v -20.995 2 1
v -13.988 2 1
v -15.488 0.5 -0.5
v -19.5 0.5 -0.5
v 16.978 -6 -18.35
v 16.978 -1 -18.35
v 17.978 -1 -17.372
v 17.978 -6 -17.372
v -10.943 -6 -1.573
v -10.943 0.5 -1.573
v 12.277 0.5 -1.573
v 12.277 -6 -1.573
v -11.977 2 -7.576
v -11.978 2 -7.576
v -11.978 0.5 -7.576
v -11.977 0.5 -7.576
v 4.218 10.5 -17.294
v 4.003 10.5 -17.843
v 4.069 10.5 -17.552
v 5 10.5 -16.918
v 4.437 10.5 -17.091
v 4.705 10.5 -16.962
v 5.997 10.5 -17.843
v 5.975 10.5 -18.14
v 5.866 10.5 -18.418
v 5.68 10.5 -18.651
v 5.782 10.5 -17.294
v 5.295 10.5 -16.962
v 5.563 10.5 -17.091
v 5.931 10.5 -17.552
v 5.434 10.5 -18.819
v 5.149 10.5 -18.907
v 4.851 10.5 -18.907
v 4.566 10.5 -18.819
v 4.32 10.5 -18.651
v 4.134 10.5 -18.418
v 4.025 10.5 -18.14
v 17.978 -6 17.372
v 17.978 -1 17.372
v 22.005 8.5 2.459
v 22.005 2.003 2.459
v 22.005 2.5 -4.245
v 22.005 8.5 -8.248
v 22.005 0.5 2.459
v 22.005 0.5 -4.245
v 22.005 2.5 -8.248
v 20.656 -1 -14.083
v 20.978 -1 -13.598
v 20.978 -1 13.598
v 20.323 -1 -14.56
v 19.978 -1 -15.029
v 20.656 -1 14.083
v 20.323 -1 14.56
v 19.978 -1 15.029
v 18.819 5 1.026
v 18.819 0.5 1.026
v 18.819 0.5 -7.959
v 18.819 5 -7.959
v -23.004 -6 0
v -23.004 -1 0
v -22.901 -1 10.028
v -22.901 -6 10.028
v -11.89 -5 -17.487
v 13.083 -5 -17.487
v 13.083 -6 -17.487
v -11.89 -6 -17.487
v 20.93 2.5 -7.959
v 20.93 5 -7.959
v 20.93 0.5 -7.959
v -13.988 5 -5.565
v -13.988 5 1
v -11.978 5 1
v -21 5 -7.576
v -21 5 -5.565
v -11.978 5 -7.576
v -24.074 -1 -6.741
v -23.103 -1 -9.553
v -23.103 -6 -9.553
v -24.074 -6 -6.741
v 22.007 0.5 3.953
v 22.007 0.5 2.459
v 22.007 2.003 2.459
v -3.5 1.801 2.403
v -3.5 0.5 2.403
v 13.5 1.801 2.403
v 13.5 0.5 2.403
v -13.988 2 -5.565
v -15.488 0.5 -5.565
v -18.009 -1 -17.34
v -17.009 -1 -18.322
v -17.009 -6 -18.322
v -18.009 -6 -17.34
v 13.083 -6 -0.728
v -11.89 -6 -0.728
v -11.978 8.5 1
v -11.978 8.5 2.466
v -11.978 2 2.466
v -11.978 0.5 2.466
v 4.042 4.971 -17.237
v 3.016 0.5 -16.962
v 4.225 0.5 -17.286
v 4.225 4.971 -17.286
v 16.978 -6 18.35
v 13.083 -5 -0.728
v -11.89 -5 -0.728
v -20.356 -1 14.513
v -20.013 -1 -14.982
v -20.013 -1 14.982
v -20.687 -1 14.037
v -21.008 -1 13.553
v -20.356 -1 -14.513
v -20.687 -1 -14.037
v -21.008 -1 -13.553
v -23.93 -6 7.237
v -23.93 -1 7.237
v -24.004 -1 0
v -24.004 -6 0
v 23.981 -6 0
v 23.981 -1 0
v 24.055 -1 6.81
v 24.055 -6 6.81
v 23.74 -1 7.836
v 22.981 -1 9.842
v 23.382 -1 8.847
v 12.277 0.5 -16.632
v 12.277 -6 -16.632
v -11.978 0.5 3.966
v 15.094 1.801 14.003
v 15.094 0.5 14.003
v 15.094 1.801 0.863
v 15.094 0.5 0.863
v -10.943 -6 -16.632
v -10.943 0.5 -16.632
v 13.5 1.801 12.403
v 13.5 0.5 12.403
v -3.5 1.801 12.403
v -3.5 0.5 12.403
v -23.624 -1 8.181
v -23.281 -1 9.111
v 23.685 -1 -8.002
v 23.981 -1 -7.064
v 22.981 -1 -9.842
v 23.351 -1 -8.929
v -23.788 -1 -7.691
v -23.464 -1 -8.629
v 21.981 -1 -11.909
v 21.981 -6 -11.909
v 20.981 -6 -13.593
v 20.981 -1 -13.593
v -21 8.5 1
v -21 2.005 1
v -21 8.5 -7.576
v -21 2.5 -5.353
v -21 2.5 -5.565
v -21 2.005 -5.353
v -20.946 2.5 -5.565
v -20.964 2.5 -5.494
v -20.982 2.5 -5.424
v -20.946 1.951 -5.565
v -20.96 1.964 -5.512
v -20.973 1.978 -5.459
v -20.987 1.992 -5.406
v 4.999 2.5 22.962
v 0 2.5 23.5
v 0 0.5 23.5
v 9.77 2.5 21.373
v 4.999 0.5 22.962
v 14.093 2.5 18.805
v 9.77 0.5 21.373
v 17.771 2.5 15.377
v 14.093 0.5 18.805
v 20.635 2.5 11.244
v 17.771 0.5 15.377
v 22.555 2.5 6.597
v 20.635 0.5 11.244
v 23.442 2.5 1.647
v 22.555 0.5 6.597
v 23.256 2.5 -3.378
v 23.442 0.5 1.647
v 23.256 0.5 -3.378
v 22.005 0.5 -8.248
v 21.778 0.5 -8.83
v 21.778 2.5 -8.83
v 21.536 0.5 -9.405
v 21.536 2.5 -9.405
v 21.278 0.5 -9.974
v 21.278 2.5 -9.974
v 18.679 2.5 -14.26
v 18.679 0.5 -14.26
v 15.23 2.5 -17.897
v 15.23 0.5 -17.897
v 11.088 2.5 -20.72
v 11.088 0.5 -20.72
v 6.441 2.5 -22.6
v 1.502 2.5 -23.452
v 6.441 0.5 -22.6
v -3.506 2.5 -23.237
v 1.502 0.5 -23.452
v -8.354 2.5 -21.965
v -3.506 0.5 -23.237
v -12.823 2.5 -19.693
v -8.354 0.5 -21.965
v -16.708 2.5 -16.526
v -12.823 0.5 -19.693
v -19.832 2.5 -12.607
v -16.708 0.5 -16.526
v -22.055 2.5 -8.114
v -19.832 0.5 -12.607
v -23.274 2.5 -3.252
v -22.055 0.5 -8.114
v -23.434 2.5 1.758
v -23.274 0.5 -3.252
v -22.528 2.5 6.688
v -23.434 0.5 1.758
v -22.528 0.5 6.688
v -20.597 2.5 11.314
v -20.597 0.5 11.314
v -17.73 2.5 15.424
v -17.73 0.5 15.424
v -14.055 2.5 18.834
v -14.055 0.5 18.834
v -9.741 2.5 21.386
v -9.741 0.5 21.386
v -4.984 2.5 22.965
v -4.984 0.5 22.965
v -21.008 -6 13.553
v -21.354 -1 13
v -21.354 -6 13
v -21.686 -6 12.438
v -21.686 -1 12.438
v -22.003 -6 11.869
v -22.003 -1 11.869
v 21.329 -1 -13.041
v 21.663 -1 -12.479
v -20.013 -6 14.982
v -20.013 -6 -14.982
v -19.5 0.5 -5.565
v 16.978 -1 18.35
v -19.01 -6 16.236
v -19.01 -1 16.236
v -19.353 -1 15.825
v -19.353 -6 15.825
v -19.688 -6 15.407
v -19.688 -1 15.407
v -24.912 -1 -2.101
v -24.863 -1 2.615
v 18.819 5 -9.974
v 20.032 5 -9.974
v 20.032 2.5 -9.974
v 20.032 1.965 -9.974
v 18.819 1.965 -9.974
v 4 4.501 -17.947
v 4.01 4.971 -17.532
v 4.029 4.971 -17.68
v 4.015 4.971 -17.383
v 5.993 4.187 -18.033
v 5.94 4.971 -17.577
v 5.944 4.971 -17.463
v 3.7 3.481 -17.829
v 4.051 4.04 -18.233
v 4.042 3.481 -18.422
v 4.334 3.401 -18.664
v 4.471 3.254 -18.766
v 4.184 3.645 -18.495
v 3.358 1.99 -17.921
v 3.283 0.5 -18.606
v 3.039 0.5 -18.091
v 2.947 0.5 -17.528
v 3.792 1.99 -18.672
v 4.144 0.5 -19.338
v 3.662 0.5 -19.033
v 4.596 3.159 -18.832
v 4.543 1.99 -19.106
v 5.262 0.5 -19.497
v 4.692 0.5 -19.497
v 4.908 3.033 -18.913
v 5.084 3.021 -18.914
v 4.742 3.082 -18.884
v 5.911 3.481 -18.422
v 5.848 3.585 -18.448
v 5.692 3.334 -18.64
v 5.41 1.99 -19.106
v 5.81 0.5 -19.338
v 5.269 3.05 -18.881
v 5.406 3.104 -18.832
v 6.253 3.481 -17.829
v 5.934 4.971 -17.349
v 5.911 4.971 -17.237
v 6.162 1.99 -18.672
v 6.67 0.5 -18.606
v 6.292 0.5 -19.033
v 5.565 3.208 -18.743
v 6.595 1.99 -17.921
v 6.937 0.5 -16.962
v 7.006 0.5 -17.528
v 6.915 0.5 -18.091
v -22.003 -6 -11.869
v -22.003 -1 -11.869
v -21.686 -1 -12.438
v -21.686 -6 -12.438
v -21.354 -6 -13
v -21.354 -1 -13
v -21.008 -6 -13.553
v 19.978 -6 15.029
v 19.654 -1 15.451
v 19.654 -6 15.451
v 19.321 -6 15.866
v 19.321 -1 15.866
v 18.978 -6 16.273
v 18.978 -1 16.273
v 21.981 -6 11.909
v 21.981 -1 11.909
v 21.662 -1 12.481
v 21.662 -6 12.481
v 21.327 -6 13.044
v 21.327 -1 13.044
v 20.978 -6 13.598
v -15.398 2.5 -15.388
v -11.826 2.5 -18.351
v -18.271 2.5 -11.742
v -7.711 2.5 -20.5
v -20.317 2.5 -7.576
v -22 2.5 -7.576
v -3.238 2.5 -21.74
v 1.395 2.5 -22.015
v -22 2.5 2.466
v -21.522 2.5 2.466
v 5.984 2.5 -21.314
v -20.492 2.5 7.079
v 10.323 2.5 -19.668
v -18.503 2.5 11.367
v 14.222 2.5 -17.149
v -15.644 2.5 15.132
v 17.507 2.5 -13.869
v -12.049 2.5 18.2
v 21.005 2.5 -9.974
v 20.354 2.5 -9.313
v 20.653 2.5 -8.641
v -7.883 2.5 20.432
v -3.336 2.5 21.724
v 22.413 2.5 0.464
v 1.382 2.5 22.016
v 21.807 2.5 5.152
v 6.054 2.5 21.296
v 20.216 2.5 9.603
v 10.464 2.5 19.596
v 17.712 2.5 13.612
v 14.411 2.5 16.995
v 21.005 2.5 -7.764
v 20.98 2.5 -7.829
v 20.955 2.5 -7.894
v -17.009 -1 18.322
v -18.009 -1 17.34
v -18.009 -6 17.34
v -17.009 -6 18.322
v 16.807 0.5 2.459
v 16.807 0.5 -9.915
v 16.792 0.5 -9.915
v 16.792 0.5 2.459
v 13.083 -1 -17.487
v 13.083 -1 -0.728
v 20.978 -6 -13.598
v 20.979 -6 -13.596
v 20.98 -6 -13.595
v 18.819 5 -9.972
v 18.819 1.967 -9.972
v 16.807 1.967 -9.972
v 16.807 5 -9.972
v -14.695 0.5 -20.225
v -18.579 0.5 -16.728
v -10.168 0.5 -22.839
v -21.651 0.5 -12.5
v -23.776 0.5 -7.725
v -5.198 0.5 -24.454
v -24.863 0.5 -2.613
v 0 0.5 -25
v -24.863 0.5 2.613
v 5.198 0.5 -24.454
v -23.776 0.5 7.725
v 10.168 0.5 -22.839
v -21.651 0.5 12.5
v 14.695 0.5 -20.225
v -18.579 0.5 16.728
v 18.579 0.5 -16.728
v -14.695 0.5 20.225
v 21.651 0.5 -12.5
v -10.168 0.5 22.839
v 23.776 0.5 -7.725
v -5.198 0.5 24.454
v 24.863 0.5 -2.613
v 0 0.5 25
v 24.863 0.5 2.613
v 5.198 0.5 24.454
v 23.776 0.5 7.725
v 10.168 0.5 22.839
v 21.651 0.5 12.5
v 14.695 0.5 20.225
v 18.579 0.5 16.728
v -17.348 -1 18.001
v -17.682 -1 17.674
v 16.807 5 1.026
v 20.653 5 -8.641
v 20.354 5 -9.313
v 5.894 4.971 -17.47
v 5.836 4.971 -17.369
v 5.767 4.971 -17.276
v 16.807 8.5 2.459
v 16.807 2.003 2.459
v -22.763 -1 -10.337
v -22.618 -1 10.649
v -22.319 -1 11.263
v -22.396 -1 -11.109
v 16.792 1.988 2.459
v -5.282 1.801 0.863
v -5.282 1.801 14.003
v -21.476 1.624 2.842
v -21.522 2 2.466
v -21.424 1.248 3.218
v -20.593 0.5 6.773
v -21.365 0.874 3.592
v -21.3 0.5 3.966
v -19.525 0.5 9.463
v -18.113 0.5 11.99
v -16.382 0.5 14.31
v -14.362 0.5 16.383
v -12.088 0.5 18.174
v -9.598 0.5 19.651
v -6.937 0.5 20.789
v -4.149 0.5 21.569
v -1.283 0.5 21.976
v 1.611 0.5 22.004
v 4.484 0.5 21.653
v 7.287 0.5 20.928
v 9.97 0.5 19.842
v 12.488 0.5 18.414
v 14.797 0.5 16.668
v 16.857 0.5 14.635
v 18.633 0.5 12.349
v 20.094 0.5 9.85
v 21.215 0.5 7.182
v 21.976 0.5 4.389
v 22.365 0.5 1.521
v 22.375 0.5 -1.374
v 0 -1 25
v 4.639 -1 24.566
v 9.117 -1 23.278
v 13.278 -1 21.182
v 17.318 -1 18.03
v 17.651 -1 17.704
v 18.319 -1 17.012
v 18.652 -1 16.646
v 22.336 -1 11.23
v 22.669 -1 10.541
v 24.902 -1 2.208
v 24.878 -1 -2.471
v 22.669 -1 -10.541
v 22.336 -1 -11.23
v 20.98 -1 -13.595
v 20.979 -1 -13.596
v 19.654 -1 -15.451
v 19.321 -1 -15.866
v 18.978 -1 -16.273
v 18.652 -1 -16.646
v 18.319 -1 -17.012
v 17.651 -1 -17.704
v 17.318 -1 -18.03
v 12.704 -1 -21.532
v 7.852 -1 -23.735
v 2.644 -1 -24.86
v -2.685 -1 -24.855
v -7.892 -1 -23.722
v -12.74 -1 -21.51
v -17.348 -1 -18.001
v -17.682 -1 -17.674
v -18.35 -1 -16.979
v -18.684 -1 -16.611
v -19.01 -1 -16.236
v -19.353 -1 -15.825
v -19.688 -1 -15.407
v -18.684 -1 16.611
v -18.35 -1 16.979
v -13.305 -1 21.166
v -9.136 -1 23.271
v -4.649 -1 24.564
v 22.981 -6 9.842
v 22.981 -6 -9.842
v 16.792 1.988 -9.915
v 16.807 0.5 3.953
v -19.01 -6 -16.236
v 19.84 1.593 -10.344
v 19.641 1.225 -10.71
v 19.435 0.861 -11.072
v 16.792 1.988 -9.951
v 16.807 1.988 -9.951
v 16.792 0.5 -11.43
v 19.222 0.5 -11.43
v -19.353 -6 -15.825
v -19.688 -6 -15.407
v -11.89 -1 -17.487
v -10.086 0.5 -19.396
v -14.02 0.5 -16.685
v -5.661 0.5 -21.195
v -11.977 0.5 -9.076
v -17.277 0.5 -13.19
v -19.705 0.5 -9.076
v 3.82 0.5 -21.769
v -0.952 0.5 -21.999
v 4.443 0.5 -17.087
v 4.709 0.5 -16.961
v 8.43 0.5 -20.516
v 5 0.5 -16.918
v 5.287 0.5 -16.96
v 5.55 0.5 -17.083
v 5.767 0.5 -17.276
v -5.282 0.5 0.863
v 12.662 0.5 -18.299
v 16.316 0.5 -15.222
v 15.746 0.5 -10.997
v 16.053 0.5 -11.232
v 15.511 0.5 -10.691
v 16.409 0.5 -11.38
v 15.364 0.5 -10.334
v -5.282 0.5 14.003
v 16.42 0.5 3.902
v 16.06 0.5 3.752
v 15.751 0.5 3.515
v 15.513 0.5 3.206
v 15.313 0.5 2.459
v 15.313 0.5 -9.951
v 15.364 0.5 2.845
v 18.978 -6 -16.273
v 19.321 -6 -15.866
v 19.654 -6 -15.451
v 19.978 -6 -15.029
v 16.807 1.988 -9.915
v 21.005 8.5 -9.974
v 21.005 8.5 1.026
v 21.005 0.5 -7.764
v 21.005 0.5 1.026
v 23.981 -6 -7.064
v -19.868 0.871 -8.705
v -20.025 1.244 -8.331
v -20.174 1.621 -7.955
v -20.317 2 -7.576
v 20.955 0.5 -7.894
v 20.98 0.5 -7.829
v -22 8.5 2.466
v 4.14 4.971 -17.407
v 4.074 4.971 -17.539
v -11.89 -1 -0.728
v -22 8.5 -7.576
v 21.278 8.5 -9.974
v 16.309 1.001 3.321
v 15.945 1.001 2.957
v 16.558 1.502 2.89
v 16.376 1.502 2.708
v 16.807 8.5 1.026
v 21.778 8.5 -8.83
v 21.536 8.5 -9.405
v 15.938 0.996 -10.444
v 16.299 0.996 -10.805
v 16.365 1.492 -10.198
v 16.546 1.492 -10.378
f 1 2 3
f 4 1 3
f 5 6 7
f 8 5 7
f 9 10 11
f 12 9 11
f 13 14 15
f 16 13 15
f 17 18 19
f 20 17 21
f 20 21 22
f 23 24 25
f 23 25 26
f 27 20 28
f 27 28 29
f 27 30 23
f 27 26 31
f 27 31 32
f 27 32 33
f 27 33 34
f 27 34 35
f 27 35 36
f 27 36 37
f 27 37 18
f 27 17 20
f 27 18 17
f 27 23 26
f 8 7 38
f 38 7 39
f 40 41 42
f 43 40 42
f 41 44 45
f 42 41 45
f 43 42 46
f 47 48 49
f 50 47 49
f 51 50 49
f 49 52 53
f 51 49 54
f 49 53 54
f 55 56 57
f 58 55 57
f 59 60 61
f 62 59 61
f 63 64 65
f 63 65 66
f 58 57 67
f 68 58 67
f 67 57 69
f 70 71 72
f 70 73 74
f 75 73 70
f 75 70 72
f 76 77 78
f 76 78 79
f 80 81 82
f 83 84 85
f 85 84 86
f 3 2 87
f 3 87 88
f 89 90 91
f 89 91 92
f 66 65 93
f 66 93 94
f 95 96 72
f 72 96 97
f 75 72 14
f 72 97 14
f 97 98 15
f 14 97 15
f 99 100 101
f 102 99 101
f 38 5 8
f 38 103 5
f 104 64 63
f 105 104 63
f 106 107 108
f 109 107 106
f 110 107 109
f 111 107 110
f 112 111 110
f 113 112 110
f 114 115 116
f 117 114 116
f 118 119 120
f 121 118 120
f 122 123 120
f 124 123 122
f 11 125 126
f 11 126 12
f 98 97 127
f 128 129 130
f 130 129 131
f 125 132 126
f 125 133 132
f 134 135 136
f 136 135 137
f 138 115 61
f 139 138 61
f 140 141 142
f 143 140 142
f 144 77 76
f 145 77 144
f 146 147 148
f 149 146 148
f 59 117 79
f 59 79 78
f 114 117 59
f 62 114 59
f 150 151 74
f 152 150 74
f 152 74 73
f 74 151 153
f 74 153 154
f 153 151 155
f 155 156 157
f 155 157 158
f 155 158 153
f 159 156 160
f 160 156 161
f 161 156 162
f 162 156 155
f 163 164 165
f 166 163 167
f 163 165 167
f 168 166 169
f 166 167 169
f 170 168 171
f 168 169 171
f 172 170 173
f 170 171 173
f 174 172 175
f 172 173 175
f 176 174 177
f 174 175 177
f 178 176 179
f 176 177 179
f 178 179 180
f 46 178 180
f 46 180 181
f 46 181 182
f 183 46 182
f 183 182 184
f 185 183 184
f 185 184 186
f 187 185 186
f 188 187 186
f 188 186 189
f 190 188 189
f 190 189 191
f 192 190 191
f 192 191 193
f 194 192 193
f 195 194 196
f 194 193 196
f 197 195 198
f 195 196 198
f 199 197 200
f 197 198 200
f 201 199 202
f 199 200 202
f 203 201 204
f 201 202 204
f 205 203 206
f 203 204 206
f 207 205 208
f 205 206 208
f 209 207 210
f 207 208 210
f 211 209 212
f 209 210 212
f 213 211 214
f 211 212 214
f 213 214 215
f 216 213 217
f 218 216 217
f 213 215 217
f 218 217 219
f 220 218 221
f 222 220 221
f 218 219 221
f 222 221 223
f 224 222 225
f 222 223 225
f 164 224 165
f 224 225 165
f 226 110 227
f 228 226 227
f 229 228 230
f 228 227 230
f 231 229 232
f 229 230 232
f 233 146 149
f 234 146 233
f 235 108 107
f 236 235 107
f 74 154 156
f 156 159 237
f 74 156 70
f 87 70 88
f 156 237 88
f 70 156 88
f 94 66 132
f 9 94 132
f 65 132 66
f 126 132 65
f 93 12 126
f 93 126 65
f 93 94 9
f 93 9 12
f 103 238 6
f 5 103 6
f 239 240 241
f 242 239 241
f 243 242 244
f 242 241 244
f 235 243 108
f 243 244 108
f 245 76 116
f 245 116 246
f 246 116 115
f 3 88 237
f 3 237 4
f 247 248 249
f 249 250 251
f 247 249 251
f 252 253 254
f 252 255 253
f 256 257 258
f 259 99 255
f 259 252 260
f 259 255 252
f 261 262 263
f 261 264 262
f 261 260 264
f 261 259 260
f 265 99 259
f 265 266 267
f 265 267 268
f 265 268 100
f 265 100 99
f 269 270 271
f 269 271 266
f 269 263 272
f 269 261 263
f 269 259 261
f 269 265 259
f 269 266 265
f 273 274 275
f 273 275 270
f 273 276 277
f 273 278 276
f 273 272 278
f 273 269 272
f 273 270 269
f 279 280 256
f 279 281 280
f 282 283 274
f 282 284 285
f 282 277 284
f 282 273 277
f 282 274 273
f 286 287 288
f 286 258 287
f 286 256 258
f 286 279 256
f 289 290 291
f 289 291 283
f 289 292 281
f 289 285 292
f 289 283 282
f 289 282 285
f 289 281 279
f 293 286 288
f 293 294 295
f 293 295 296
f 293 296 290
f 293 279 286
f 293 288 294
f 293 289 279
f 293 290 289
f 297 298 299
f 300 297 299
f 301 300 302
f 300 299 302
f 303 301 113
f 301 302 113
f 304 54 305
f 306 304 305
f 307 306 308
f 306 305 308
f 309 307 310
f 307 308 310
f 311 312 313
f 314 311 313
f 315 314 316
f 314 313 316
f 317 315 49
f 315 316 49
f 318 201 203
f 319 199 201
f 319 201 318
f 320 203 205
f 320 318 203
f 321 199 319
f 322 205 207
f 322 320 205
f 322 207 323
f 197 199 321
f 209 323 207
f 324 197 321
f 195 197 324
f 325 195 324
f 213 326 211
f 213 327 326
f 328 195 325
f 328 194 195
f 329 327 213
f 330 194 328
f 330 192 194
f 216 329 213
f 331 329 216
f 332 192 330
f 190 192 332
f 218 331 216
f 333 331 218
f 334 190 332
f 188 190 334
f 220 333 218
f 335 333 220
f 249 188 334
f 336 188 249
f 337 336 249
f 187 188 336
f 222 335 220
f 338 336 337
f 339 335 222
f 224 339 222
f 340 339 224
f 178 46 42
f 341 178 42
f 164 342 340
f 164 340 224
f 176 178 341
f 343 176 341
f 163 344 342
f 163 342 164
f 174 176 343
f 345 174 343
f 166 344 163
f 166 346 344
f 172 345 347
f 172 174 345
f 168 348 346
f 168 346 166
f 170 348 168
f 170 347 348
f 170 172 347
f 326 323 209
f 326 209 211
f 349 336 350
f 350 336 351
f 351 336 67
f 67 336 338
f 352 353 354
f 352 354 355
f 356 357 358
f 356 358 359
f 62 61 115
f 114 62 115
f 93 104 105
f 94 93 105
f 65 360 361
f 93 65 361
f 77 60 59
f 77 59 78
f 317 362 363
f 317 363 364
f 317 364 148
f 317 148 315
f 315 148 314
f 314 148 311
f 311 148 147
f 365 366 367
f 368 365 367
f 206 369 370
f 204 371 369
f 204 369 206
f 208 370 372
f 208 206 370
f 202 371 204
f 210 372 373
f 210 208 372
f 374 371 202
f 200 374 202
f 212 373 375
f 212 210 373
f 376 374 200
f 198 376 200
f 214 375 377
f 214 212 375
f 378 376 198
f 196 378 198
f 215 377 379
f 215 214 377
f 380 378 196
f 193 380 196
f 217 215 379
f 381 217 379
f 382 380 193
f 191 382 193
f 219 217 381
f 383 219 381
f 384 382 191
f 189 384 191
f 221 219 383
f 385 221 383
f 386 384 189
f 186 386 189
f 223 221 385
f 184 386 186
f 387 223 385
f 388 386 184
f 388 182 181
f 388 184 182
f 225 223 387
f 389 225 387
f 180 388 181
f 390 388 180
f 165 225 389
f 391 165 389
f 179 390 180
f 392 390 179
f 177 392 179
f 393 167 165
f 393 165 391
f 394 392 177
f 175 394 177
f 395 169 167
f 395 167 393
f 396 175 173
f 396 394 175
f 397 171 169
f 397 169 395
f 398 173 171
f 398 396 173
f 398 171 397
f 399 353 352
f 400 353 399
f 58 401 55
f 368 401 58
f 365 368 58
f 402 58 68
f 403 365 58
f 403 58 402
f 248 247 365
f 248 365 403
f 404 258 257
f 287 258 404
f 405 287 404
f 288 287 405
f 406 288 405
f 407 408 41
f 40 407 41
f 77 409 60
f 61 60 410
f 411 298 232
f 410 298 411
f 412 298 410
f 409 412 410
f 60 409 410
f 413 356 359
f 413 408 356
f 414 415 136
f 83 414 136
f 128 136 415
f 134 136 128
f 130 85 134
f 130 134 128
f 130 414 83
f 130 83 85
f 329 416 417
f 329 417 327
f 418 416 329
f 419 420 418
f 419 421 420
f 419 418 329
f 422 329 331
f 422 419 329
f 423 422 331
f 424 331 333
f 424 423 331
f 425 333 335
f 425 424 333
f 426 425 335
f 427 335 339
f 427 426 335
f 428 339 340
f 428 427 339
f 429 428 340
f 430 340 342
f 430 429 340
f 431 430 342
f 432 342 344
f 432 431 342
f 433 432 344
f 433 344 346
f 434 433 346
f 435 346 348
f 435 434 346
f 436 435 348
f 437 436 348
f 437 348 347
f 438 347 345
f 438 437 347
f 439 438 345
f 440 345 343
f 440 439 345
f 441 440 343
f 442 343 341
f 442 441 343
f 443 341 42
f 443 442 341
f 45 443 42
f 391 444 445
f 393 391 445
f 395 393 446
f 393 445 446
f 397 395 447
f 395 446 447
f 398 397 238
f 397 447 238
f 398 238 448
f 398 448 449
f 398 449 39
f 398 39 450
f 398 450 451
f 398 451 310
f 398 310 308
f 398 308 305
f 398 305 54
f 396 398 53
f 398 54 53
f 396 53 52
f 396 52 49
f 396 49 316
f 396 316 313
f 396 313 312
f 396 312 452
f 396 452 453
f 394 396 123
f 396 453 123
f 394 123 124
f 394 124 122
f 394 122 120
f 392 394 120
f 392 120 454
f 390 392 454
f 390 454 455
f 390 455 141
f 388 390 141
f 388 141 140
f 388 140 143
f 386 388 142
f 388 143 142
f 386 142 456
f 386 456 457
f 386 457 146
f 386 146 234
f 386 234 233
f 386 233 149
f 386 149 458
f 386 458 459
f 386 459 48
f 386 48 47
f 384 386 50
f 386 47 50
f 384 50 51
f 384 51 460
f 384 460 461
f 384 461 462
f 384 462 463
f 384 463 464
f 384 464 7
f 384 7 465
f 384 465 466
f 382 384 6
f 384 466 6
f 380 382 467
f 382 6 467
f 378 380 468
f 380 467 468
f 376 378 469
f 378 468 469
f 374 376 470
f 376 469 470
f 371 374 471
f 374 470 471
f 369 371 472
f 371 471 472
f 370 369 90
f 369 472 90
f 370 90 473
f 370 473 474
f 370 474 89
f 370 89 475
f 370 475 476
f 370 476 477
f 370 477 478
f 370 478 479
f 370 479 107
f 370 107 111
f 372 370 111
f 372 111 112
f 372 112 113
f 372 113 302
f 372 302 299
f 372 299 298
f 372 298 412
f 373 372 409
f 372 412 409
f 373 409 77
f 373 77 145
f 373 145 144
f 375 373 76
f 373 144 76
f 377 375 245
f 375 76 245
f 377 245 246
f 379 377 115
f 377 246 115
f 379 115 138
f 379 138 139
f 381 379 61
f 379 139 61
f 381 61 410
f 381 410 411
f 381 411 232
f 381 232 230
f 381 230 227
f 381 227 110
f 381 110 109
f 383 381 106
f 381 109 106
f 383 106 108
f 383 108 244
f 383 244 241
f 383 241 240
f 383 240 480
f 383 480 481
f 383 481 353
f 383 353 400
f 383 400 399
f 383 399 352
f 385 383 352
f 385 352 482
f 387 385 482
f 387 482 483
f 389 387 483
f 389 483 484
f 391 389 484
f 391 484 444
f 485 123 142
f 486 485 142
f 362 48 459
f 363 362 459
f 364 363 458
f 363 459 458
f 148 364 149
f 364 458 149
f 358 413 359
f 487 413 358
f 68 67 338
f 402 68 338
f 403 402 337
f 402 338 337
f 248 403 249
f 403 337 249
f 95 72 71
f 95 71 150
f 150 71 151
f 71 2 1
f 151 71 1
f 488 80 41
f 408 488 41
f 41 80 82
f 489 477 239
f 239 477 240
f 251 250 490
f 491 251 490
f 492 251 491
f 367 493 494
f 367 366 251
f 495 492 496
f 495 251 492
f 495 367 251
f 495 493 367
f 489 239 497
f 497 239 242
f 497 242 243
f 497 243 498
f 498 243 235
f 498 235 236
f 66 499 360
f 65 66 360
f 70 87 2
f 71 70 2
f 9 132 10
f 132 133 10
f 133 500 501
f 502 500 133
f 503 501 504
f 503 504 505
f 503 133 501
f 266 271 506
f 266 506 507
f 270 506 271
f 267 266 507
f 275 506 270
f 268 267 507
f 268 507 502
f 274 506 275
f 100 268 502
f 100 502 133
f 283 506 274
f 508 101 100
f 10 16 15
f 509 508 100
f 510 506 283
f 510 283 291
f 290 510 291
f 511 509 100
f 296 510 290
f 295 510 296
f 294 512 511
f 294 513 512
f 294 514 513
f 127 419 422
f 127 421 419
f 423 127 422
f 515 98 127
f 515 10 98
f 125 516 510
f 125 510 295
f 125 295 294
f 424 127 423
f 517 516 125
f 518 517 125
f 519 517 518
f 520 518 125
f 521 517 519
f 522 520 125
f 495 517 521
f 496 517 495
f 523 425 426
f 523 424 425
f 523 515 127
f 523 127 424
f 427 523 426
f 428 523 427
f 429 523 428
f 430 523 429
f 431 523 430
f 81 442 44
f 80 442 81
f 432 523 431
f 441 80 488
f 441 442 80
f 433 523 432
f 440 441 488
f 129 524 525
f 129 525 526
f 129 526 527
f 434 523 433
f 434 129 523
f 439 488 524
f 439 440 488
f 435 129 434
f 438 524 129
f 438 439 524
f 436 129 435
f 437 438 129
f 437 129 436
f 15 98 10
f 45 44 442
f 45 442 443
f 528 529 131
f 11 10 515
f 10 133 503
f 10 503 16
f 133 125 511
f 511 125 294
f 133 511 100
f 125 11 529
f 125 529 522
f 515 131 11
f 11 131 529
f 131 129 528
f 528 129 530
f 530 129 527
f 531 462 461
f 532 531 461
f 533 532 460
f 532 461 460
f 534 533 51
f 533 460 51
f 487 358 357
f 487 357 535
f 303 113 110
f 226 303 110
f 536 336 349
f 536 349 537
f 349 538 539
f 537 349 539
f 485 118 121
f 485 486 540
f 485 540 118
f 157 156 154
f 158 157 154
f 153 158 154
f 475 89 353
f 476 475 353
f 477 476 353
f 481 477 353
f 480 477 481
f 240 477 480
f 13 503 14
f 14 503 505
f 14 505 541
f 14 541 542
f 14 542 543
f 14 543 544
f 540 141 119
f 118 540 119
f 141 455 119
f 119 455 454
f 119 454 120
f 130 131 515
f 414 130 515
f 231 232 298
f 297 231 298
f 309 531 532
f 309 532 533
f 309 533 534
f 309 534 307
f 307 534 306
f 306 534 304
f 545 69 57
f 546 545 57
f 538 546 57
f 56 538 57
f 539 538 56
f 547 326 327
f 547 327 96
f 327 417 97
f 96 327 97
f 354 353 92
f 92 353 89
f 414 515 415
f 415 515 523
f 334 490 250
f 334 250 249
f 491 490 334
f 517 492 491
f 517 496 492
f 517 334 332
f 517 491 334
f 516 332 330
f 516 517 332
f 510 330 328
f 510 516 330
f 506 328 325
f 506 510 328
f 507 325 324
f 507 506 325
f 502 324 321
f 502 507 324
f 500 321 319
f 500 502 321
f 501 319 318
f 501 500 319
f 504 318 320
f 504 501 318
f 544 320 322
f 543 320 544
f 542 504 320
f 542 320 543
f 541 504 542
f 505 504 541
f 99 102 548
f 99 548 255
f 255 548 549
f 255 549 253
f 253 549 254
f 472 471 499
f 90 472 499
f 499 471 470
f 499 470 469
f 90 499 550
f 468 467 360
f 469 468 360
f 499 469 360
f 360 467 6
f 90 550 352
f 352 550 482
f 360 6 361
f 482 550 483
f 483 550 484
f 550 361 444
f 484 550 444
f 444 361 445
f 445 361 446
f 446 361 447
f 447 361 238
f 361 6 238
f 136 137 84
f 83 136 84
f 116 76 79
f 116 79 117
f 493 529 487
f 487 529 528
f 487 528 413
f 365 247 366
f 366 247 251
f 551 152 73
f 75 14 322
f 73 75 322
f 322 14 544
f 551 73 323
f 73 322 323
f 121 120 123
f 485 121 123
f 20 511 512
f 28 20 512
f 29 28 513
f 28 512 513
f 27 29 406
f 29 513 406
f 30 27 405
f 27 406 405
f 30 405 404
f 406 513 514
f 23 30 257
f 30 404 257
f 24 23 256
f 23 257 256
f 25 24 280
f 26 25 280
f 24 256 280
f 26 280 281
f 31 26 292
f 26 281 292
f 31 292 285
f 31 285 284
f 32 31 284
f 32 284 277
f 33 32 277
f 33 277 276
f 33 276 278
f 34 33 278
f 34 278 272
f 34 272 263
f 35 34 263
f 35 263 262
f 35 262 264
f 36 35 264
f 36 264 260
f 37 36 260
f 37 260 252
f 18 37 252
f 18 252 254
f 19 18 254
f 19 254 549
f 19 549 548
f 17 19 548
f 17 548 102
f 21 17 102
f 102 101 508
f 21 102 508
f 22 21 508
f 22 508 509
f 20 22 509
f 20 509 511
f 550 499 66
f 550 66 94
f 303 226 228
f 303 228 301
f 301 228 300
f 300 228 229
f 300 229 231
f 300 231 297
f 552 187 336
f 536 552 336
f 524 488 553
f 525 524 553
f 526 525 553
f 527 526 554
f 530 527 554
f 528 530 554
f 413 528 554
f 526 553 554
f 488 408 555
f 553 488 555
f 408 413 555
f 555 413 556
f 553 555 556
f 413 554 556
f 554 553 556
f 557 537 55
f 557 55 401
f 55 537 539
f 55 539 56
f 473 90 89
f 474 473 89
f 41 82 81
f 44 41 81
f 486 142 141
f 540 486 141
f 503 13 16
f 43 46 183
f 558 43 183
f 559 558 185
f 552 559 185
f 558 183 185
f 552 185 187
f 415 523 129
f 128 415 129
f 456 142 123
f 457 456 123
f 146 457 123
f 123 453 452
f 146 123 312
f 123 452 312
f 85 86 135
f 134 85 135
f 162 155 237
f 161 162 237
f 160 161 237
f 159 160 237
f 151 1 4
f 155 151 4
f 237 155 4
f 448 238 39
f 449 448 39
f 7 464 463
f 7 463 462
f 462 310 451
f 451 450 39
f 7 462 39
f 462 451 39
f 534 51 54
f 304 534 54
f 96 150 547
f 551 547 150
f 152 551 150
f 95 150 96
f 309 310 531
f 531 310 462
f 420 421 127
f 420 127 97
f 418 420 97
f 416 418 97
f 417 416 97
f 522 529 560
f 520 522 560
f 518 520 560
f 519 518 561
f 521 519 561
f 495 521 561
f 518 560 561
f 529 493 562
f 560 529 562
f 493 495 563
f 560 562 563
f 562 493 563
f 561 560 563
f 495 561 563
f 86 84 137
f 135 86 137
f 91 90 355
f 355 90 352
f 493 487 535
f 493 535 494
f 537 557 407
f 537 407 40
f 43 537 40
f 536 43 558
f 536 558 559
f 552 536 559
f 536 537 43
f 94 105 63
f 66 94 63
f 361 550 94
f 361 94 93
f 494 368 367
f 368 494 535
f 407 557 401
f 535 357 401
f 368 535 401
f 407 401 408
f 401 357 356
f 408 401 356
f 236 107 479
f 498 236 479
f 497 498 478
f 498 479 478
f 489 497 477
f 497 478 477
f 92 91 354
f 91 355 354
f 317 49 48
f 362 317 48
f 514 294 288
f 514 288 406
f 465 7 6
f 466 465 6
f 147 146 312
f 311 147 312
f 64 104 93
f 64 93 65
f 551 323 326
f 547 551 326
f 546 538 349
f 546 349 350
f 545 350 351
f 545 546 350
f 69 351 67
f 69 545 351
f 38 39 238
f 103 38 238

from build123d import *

# Parameters (mm, degrees)
BOSS_EXTRUDE1_DEPTH       = 0.5
BOSS_EXTRUDE1_DEPTH_BACK  = 1
SKETCH1_R                 = 25
SKETCH17_R                = 23.5
SKETCH17_R_2              = 22.038870545
BOSS_EXTRUDE15_DEPTH      = 2
SKETCH2_R                 = 1
BOSS_EXTRUDE2_DEPTH       = 10
BOSS_EXTRUDE11_DEPTH      = 5
SKETCH12_W                = 23.219340148
SKETCH12_H                = 15.058436642
CUT_EXTRUDE2_DEPTH        = 5
SKETCH15_W                = 24.972946701
SKETCH15_H                = 16.75913787
SKETCH15_W_2              = 23.219340148
SKETCH15_H_2              = 15.058436642
BOSS_EXTRUDE13_DEPTH      = 5
BOSS_EXTRUDE14_DEPTH      = 0.0001
BOSS_EXTRUDE14_DEPTH_BACK = 1
SKETCH16_W                = 24.972946701
SKETCH16_H                = 16.75913787
BOSS_EXTRUDE16_DEPTH      = 8
BOSS_EXTRUDE17_DEPTH      = 1.301
BOSS_EXTRUDE18_DEPTH      = 4.5
REVOLVE1_ANGLE            = 195
REVOLVE1_OTHER_WAY_ANGLE  = 15
BOSS_EXTRUDE20_DEPTH      = 7.5
BOSS_EXTRUDE21_DEPTH      = 7.5
BOSS_EXTRUDE22_DEPTH      = 0.0001
BOSS_EXTRUDE22_DEPTH_BACK = 10.05
BOSS_EXTRUDE23_DEPTH      = 0.0001
BOSS_EXTRUDE23_DEPTH_BACK = 5.2001
REVOLVE2_ANGLE            = 90
BOSS_EXTRUDE25_DEPTH      = 12.41001
REVOLVE3_ANGLE            = 90
BOSS_EXTRUDE26_DEPTH      = 3.41001
BOSS_EXTRUDE27_DEPTH      = 0.001
BOSS_EXTRUDE27_DEPTH_BACK = 8.41001
BOSS_EXTRUDE28_DEPTH      = 7.001


# Read off the part's stored shape, not the designer's step: Boss-Extrude16, Boss-Extrude18
with BuildPart() as part:
    # Sketch1 → Boss-Extrude1 (new, two sides: drawn at the far end of the back side and taken through both)
    with BuildSketch(Plane(origin=(0, 0, 0), x_dir=(1, 0, 0), z_dir=(0, 1, 0)).offset(-BOSS_EXTRUDE1_DEPTH_BACK)):
        with Locations(Location((0, 0, 0), (0, 0, 270))):
            Circle(SKETCH1_R)
    extrude(amount=BOSS_EXTRUDE1_DEPTH + BOSS_EXTRUDE1_DEPTH_BACK)

    # Sketch17 → Boss-Extrude15 (add)
    with BuildSketch(Plane(origin=(0, 0.5, 0), x_dir=(1, 0, 0), z_dir=(0, 1, 0))):
        with Locations(Location((0, 0, 0), (0, 0, 270))):
            Circle(SKETCH17_R)
        with Locations(Location((0.378928968, 0, 0), (0, 0, 270))):
            Circle(SKETCH17_R_2, mode=Mode.SUBTRACT)
    extrude(amount=BOSS_EXTRUDE15_DEPTH)

    # Sketch2 → Boss-Extrude2 (add)
    with BuildSketch(Plane(origin=(0, 0.5, 0), x_dir=(1, 0, 0), z_dir=(0, 1, 0))):
        with Locations(Location((5, 17.917691699, 0), (0, 0, 270))):
            Circle(SKETCH2_R)
    extrude(amount=BOSS_EXTRUDE2_DEPTH)

    # Sketch14 → Boss-Extrude11 (add)
    with BuildSketch(Plane.XZ.offset(1)):
        with BuildLine():
            Line((-20.013234661, 0), (-20.013234661, -14.982337549))
            ThreePointArc((-20.013234661, -14.982337549), (-19.5217563, -15.617331109), (-19.01013874, -16.236213385))
            Line((-19.01013874, -16.236213385), (-19.01013874, 0))
            Line((-19.01013874, 0), (-20.013234661, 0))
        make_face()
        with BuildLine():
            ThreePointArc((-19.01013874, 16.236213385), (-19.5217563, 15.617331109), (-20.013234661, 14.982337549))
            Line((-20.013234661, 14.982337549), (-20.013234661, 14.219543585))
            Line((-20.013234661, 14.219543585), (-20.013234661, 0))
            Line((-20.013234661, 0), (-19.01013874, 0))
            Line((-19.01013874, 0), (-19.01013874, 16.236213385))
        make_face()
        with BuildLine():
            Line((-22.003120492, 11.868558827), (-22.003120492, 0))
            Line((-22.003120492, 0), (-22.003120492, -11.868558827))
            ThreePointArc((-22.003120492, -11.868558827), (-21.521946756, -12.720291185), (-21.007819435, -13.552546719))
            Line((-21.007819435, -13.552546719), (-21.007819435, 0))
            Line((-21.007819435, 0), (-21.007819435, 13.552546719))
            ThreePointArc((-21.007819435, 13.552546719), (-21.521946756, 12.720291185), (-22.003120492, 11.868558827))
        make_face()
        Polygon((-23.929592496, 7.237029985), (-24.00431724, 0), (-23.00431724, 0), (-22.900778107, 10.027679797), align=None)
        Polygon((-23.102951801, -9.552675963), (-24.07392421, -6.741377687), (-24.00431724, 0), (-23.00431724, 0), align=None)
        Polygon((16.978448552, 0), (16.978448552, -18.350266613), (17.978448552, -17.371683501), (17.978448552, 0), align=None)
        with BuildLine():
            ThreePointArc((19.978448552, 15.02869234), (19.488385916, 15.658953171), (18.978448552, 16.273244623))
            Line((18.978448552, 16.273244623), (18.978448552, 0))
            Line((18.978448552, 0), (19.978448552, 0))
            Line((19.978448552, 0), (19.978448552, 15.02869234))
        make_face()
        Polygon((17.978448552, 17.371683501), (16.978448552, 18.350266613), (16.978448552, 0), (17.978448552, 0), align=None)
        Polygon((21.981386368, 0), (21.981386368, 11.908763719), (20.981386368, 11.858054365), (20.981386368, 0), align=None)
        with BuildLine():
            Line((19.978448552, 0), (18.978448552, 0))
            Line((18.978448552, 0), (18.978448552, -16.273244623))
            ThreePointArc((18.978448552, -16.273244623), (19.488385916, -15.658953171), (19.978448552, -15.02869234))
            Line((19.978448552, -15.02869234), (19.978448552, 0))
        make_face()
        Polygon((21.981386368, 0), (21.981386368, -11.908763719), (20.981386368, -13.593433196), (20.981386368, 0), align=None)
        Polygon((23.981386368, -7.063505351), (23.981386368, 0), (22.981386368, 0), (22.981386368, -9.841538527), align=None)
        Polygon((24.054519754, 6.810292166), (22.981386368, 9.841538527), (22.981386368, 0), (23.981386368, 0), align=None)
        with BuildLine():
            ThreePointArc((21.981386368, 11.908763719), (21.49651613, 12.763220373), (20.978448552, 13.597966625))
            Line((20.978448552, 13.597966625), (20.978448552, 0))
            Line((20.978448552, 0), (20.978448552, -13.597966625))
            ThreePointArc((20.978448552, -13.597966625), (20.979917583, -13.59569999), (20.981386368, -13.593433196))
            Line((20.981386368, -13.593433196), (20.981386368, 0))
            Line((20.981386368, 0), (20.981386368, 11.858054365))
            Line((20.981386368, 11.858054365), (21.981386368, 11.908763719))
        make_face()
        Polygon((-17.008979136, -18.321971203), (-18.008979136, -17.340030867), (-18.008979136, 0), (-17.008979136, 0), align=None)
        Polygon((-18.008979136, 17.340030867), (-17.008979136, 18.321971203), (-17.008979136, 0), (-18.008979136, 0), align=None)
    extrude(amount=BOSS_EXTRUDE11_DEPTH)

    # Sketch12 → Cut-Extrude2 (cut)
    with BuildSketch(Plane(origin=(0, 0.5, 0), x_dir=(1, 0, 0), z_dir=(0, 1, 0))):
        with Locations((0.666876956, 9.102631979)):
            Rectangle(SKETCH12_W, SKETCH12_H)
    extrude(amount=-CUT_EXTRUDE2_DEPTH, mode=Mode.SUBTRACT)

    # Sketch15 → Boss-Extrude13 (add)
    with BuildSketch(Plane.XZ.offset(1)):
        with Locations((0.596477735, -9.107727728)):
            Rectangle(SKETCH15_W, SKETCH15_H)
        with Locations((0.666876956, -9.102631979)):
            Rectangle(SKETCH15_W_2, SKETCH15_H_2, mode=Mode.SUBTRACT)
    extrude(amount=BOSS_EXTRUDE13_DEPTH)

    # Boss-Extrude16 outline → Boss-Extrude16 (add)
    with BuildSketch(Plane(origin=(0, 0.5, 0), x_dir=(1, 0, 0), z_dir=(0, 1, 0))):
        with BuildLine():
            Line((21.278371263, 9.97401205), (21.005108017, 9.97401205))
            Line((21.005108017, 9.97401205), (21.005108017, -1.02598795))
            Line((21.005108017, -1.02598795), (16.80718978, -1.02598795))
            Line((16.80718978, -1.02598795), (16.80718978, -2.458711062))
            Line((16.80718978, -2.458711062), (22.005108017, -2.458711062))
            Line((22.005108017, -2.458711062), (22.005108017, 8.247740366))
            ThreePointArc((22.005108017, 8.247740366), (21.658944991, 9.118119425), (21.278371263, 9.97401205))
        make_face()
        Polygon((-22, -2.465798727), (-11.97807381, -2.465798727), (-11.97807381, -1), (-21, -1), (-21, 7.575525784), (-22, 7.575525784), align=None)
    extrude(amount=BOSS_EXTRUDE16_DEPTH)

    # Sketch18 → Boss-Extrude17 (add)
    with BuildSketch(Plane(origin=(0, 0.5, 0), x_dir=(1, 0, 0), z_dir=(0, 1, 0))):
        Polygon((0, -2.402962183), (0, -0.862974972), (-5.282158739, -0.862974972), (-5.282158739, -14.003106764), (0, -14.003106764), (0, -12.402962183), (-3.5, -12.402962183), (-3.5, -2.402962183), align=None)
        Polygon((15.094136196, -0.862974972), (0.201079682, -0.862974972), (0.559908327, -2.402962183), (13.5, -2.402962183), (13.5, -12.402962183), (2.889983811, -12.402962183), (3.262829577, -14.003106764), (15.094136196, -14.003106764), align=None)
        Polygon((2.889983811, -12.402962183), (0, -12.402962183), (0, -14.003106764), (3.262829577, -14.003106764), align=None)
        Polygon((0.201079682, -0.862974972), (0, -0.862974972), (0, -2.402962183), (0.559908327, -2.402962183), align=None)
    extrude(amount=BOSS_EXTRUDE17_DEPTH)

    # Boss-Extrude18 outline → Boss-Extrude18 (add)
    with BuildSketch(Plane(origin=(0, 0.5, 0), x_dir=(1, 0, 0), z_dir=(0, 1, 0))):
        with BuildLine():
            Line((16.80718978, 9.972233135), (16.80718978, -1.02598795))
            Line((16.80718978, -1.02598795), (18.818512993, -1.02598795))
            Line((18.818512993, -1.02598795), (18.818512993, 7.959494075))
            Line((18.818512993, 7.959494075), (20.930285832, 7.959494075))
            ThreePointArc((20.930285832, 7.959494075), (20.506206092, 8.978002587), (20.031687006, 9.97401205))
            Line((20.031687006, 9.97401205), (18.818512993, 9.97401205))
            Line((18.818512993, 9.97401205), (18.818512993, 9.972233135))
            Line((18.818512993, 9.972233135), (16.80718978, 9.972233135))
        make_face()
        Polygon((-13.988084857, -1), (-11.97807381, -1), (-11.97807381, 7.575525784), (-21, 7.575525784), (-21, 5.565099869), (-13.988084857, 5.565099869), align=None)
    extrude(amount=BOSS_EXTRUDE18_DEPTH)

    # Sketch22 → Revolve1 (revolve)
    with BuildSketch(Plane(origin=(0, 0, -17.487296663), x_dir=(-1, 0, 0), z_dir=(0, 0, -1))):
        Polygon((-4.976750106, 2.5), (-4.976750106, 4.97103297), (-5.944220353, 4.97103297), (-7.362854562, -1), (-4.976750106, -1), align=None)
    revolve(axis=Axis((4.976750106, 2.5, -17.487296663), (0, 1, 0)), revolution_arc=REVOLVE1_ANGLE)

    # Sketch22 → Revolve1 other way (revolve)
    with BuildSketch(Plane(origin=(0, 0, -17.487296663), x_dir=(-1, 0, 0), z_dir=(0, 0, -1))):
        Polygon((-4.976750106, 2.5), (-4.976750106, 4.97103297), (-5.944220353, 4.97103297), (-7.362854562, -1), (-4.976750106, -1), align=None)
    revolve(axis=Axis((4.976750106, 2.5, -17.487296663), (0, -1, 0)), revolution_arc=REVOLVE1_OTHER_WAY_ANGLE)

    # Sketch23 → Boss-Extrude20 (add)
    with BuildSketch(Plane(origin=(0, 0, 1), x_dir=(-1, 0, 0), z_dir=(0, 0, -1))):
        Polygon((21, 0.5), (21, 2.00493968), (19.5, 0.5), align=None)
    extrude(amount=BOSS_EXTRUDE20_DEPTH)

    # Sketch24 → Boss-Extrude21 (add)
    with BuildSketch(Plane.ZY.offset(13.988084857)):
        Polygon((1, 0.5), (1, 2), (-0.5, 0.5), align=None)
    extrude(amount=BOSS_EXTRUDE21_DEPTH)

    # Sketch25 → Boss-Extrude22 (add, two sides: drawn at the far end of the back side and taken through both)
    with BuildSketch(Plane(origin=(-11.97807381, 0, 0), x_dir=(0, 0, -1), z_dir=(1, 0, 0)).offset(-BOSS_EXTRUDE22_DEPTH_BACK)):
        Polygon((-2.465798727, 0.5), (-3.965798727, 0.5), (-2.465798727, 2), align=None)
    extrude(amount=BOSS_EXTRUDE22_DEPTH + BOSS_EXTRUDE22_DEPTH_BACK)

    # Sketch28 → Boss-Extrude23 (add, two sides: drawn at the far end of the back side and taken through both)
    with BuildSketch(Plane.ZY.offset(-16.80718978).offset(-BOSS_EXTRUDE23_DEPTH_BACK)):
        Polygon((2.458711062, 2.003228909), (2.458711062, 0.5), (3.95259513, 0.5), align=None)
    extrude(amount=BOSS_EXTRUDE23_DEPTH + BOSS_EXTRUDE23_DEPTH_BACK)

    # Sketch30 → Revolve2 (revolve)
    with BuildSketch(Plane.ZY.offset(-16.80708978)):
        Polygon((2.458711062, 2.003228909), (2.458711062, 0.5), (3.95259513, 0.5), align=None)
    revolve(axis=Axis((16.80708978, 2.003228909, 2.458711062), (0, -1, 0)), revolution_arc=REVOLVE2_ANGLE)

    # Sketch31 → Boss-Extrude25 (add)
    with BuildSketch(Plane(origin=(0, 0, 2.458711062), x_dir=(-1, 0, 0), z_dir=(0, 0, -1))):
        Polygon((-16.792249437, 1.988295734), (-16.792249437, 0.5), (-15.313205712, 0.5), align=None)
    extrude(amount=BOSS_EXTRUDE25_DEPTH)

    # Sketch32 → Revolve3 (revolve)
    with BuildSketch(Plane(origin=(0, 0, -9.951298938), x_dir=(-1, 0, 0), z_dir=(0, 0, -1))):
        Polygon((-16.792249437, 1.988295734), (-16.792249437, 0.5), (-15.313205712, 0.5), align=None)
    revolve(axis=Axis((16.792249437, 1.988295734, -9.951298938), (0, -1, 0)), revolution_arc=REVOLVE3_ANGLE)

    # Sketch33 → Boss-Extrude26 (add)
    with BuildSketch(Plane(origin=(16.792249437, 0, 0), x_dir=(0, 0, -1), z_dir=(1, 0, 0))):
        Polygon((9.951298938, 1.988295734), (11.430342663, 0.5), (9.951298938, 0.5), (9.915470666, 0.5), (9.915470666, 1.988295734), align=None)
    extrude(amount=BOSS_EXTRUDE26_DEPTH)

    # Sketch34 → Boss-Extrude27 (add, two sides: drawn at the far end of the back side and taken through both)
    with BuildSketch(Plane(origin=(-11.97807381, 0, 0), x_dir=(0, 0, -1), z_dir=(1, 0, 0)).offset(-BOSS_EXTRUDE27_DEPTH_BACK)):
        Polygon((7.575525784, 0.5), (9.075525784, 0.5), (7.575525784, 2), align=None)
    extrude(amount=BOSS_EXTRUDE27_DEPTH + BOSS_EXTRUDE27_DEPTH_BACK)

    # Sketch37 → Boss-Extrude28 (add)
    with BuildSketch(Plane.XY.offset(-5.565099869)):
        Polygon((-13.988084857, 0.5), (-13.988084857, 2), (-15.488084857, 0.5), align=None)
    extrude(amount=BOSS_EXTRUDE28_DEPTH)


with BuildPart() as body_2:
    # Sketch16 → Boss-Extrude14 (new, two sides: drawn at the far end of the back side and taken through both)
    with BuildSketch(Plane(origin=(0, -6, 0), x_dir=(-1, 0, 0), z_dir=(0, -1, 0)).offset(-BOSS_EXTRUDE14_DEPTH_BACK)):
        with Locations((-0.596477735, 9.107727728)):
            Rectangle(SKETCH16_W, SKETCH16_H)
    extrude(amount=BOSS_EXTRUDE14_DEPTH + BOSS_EXTRUDE14_DEPTH_BACK)


solid = Compound([part.part, body_2.part])
